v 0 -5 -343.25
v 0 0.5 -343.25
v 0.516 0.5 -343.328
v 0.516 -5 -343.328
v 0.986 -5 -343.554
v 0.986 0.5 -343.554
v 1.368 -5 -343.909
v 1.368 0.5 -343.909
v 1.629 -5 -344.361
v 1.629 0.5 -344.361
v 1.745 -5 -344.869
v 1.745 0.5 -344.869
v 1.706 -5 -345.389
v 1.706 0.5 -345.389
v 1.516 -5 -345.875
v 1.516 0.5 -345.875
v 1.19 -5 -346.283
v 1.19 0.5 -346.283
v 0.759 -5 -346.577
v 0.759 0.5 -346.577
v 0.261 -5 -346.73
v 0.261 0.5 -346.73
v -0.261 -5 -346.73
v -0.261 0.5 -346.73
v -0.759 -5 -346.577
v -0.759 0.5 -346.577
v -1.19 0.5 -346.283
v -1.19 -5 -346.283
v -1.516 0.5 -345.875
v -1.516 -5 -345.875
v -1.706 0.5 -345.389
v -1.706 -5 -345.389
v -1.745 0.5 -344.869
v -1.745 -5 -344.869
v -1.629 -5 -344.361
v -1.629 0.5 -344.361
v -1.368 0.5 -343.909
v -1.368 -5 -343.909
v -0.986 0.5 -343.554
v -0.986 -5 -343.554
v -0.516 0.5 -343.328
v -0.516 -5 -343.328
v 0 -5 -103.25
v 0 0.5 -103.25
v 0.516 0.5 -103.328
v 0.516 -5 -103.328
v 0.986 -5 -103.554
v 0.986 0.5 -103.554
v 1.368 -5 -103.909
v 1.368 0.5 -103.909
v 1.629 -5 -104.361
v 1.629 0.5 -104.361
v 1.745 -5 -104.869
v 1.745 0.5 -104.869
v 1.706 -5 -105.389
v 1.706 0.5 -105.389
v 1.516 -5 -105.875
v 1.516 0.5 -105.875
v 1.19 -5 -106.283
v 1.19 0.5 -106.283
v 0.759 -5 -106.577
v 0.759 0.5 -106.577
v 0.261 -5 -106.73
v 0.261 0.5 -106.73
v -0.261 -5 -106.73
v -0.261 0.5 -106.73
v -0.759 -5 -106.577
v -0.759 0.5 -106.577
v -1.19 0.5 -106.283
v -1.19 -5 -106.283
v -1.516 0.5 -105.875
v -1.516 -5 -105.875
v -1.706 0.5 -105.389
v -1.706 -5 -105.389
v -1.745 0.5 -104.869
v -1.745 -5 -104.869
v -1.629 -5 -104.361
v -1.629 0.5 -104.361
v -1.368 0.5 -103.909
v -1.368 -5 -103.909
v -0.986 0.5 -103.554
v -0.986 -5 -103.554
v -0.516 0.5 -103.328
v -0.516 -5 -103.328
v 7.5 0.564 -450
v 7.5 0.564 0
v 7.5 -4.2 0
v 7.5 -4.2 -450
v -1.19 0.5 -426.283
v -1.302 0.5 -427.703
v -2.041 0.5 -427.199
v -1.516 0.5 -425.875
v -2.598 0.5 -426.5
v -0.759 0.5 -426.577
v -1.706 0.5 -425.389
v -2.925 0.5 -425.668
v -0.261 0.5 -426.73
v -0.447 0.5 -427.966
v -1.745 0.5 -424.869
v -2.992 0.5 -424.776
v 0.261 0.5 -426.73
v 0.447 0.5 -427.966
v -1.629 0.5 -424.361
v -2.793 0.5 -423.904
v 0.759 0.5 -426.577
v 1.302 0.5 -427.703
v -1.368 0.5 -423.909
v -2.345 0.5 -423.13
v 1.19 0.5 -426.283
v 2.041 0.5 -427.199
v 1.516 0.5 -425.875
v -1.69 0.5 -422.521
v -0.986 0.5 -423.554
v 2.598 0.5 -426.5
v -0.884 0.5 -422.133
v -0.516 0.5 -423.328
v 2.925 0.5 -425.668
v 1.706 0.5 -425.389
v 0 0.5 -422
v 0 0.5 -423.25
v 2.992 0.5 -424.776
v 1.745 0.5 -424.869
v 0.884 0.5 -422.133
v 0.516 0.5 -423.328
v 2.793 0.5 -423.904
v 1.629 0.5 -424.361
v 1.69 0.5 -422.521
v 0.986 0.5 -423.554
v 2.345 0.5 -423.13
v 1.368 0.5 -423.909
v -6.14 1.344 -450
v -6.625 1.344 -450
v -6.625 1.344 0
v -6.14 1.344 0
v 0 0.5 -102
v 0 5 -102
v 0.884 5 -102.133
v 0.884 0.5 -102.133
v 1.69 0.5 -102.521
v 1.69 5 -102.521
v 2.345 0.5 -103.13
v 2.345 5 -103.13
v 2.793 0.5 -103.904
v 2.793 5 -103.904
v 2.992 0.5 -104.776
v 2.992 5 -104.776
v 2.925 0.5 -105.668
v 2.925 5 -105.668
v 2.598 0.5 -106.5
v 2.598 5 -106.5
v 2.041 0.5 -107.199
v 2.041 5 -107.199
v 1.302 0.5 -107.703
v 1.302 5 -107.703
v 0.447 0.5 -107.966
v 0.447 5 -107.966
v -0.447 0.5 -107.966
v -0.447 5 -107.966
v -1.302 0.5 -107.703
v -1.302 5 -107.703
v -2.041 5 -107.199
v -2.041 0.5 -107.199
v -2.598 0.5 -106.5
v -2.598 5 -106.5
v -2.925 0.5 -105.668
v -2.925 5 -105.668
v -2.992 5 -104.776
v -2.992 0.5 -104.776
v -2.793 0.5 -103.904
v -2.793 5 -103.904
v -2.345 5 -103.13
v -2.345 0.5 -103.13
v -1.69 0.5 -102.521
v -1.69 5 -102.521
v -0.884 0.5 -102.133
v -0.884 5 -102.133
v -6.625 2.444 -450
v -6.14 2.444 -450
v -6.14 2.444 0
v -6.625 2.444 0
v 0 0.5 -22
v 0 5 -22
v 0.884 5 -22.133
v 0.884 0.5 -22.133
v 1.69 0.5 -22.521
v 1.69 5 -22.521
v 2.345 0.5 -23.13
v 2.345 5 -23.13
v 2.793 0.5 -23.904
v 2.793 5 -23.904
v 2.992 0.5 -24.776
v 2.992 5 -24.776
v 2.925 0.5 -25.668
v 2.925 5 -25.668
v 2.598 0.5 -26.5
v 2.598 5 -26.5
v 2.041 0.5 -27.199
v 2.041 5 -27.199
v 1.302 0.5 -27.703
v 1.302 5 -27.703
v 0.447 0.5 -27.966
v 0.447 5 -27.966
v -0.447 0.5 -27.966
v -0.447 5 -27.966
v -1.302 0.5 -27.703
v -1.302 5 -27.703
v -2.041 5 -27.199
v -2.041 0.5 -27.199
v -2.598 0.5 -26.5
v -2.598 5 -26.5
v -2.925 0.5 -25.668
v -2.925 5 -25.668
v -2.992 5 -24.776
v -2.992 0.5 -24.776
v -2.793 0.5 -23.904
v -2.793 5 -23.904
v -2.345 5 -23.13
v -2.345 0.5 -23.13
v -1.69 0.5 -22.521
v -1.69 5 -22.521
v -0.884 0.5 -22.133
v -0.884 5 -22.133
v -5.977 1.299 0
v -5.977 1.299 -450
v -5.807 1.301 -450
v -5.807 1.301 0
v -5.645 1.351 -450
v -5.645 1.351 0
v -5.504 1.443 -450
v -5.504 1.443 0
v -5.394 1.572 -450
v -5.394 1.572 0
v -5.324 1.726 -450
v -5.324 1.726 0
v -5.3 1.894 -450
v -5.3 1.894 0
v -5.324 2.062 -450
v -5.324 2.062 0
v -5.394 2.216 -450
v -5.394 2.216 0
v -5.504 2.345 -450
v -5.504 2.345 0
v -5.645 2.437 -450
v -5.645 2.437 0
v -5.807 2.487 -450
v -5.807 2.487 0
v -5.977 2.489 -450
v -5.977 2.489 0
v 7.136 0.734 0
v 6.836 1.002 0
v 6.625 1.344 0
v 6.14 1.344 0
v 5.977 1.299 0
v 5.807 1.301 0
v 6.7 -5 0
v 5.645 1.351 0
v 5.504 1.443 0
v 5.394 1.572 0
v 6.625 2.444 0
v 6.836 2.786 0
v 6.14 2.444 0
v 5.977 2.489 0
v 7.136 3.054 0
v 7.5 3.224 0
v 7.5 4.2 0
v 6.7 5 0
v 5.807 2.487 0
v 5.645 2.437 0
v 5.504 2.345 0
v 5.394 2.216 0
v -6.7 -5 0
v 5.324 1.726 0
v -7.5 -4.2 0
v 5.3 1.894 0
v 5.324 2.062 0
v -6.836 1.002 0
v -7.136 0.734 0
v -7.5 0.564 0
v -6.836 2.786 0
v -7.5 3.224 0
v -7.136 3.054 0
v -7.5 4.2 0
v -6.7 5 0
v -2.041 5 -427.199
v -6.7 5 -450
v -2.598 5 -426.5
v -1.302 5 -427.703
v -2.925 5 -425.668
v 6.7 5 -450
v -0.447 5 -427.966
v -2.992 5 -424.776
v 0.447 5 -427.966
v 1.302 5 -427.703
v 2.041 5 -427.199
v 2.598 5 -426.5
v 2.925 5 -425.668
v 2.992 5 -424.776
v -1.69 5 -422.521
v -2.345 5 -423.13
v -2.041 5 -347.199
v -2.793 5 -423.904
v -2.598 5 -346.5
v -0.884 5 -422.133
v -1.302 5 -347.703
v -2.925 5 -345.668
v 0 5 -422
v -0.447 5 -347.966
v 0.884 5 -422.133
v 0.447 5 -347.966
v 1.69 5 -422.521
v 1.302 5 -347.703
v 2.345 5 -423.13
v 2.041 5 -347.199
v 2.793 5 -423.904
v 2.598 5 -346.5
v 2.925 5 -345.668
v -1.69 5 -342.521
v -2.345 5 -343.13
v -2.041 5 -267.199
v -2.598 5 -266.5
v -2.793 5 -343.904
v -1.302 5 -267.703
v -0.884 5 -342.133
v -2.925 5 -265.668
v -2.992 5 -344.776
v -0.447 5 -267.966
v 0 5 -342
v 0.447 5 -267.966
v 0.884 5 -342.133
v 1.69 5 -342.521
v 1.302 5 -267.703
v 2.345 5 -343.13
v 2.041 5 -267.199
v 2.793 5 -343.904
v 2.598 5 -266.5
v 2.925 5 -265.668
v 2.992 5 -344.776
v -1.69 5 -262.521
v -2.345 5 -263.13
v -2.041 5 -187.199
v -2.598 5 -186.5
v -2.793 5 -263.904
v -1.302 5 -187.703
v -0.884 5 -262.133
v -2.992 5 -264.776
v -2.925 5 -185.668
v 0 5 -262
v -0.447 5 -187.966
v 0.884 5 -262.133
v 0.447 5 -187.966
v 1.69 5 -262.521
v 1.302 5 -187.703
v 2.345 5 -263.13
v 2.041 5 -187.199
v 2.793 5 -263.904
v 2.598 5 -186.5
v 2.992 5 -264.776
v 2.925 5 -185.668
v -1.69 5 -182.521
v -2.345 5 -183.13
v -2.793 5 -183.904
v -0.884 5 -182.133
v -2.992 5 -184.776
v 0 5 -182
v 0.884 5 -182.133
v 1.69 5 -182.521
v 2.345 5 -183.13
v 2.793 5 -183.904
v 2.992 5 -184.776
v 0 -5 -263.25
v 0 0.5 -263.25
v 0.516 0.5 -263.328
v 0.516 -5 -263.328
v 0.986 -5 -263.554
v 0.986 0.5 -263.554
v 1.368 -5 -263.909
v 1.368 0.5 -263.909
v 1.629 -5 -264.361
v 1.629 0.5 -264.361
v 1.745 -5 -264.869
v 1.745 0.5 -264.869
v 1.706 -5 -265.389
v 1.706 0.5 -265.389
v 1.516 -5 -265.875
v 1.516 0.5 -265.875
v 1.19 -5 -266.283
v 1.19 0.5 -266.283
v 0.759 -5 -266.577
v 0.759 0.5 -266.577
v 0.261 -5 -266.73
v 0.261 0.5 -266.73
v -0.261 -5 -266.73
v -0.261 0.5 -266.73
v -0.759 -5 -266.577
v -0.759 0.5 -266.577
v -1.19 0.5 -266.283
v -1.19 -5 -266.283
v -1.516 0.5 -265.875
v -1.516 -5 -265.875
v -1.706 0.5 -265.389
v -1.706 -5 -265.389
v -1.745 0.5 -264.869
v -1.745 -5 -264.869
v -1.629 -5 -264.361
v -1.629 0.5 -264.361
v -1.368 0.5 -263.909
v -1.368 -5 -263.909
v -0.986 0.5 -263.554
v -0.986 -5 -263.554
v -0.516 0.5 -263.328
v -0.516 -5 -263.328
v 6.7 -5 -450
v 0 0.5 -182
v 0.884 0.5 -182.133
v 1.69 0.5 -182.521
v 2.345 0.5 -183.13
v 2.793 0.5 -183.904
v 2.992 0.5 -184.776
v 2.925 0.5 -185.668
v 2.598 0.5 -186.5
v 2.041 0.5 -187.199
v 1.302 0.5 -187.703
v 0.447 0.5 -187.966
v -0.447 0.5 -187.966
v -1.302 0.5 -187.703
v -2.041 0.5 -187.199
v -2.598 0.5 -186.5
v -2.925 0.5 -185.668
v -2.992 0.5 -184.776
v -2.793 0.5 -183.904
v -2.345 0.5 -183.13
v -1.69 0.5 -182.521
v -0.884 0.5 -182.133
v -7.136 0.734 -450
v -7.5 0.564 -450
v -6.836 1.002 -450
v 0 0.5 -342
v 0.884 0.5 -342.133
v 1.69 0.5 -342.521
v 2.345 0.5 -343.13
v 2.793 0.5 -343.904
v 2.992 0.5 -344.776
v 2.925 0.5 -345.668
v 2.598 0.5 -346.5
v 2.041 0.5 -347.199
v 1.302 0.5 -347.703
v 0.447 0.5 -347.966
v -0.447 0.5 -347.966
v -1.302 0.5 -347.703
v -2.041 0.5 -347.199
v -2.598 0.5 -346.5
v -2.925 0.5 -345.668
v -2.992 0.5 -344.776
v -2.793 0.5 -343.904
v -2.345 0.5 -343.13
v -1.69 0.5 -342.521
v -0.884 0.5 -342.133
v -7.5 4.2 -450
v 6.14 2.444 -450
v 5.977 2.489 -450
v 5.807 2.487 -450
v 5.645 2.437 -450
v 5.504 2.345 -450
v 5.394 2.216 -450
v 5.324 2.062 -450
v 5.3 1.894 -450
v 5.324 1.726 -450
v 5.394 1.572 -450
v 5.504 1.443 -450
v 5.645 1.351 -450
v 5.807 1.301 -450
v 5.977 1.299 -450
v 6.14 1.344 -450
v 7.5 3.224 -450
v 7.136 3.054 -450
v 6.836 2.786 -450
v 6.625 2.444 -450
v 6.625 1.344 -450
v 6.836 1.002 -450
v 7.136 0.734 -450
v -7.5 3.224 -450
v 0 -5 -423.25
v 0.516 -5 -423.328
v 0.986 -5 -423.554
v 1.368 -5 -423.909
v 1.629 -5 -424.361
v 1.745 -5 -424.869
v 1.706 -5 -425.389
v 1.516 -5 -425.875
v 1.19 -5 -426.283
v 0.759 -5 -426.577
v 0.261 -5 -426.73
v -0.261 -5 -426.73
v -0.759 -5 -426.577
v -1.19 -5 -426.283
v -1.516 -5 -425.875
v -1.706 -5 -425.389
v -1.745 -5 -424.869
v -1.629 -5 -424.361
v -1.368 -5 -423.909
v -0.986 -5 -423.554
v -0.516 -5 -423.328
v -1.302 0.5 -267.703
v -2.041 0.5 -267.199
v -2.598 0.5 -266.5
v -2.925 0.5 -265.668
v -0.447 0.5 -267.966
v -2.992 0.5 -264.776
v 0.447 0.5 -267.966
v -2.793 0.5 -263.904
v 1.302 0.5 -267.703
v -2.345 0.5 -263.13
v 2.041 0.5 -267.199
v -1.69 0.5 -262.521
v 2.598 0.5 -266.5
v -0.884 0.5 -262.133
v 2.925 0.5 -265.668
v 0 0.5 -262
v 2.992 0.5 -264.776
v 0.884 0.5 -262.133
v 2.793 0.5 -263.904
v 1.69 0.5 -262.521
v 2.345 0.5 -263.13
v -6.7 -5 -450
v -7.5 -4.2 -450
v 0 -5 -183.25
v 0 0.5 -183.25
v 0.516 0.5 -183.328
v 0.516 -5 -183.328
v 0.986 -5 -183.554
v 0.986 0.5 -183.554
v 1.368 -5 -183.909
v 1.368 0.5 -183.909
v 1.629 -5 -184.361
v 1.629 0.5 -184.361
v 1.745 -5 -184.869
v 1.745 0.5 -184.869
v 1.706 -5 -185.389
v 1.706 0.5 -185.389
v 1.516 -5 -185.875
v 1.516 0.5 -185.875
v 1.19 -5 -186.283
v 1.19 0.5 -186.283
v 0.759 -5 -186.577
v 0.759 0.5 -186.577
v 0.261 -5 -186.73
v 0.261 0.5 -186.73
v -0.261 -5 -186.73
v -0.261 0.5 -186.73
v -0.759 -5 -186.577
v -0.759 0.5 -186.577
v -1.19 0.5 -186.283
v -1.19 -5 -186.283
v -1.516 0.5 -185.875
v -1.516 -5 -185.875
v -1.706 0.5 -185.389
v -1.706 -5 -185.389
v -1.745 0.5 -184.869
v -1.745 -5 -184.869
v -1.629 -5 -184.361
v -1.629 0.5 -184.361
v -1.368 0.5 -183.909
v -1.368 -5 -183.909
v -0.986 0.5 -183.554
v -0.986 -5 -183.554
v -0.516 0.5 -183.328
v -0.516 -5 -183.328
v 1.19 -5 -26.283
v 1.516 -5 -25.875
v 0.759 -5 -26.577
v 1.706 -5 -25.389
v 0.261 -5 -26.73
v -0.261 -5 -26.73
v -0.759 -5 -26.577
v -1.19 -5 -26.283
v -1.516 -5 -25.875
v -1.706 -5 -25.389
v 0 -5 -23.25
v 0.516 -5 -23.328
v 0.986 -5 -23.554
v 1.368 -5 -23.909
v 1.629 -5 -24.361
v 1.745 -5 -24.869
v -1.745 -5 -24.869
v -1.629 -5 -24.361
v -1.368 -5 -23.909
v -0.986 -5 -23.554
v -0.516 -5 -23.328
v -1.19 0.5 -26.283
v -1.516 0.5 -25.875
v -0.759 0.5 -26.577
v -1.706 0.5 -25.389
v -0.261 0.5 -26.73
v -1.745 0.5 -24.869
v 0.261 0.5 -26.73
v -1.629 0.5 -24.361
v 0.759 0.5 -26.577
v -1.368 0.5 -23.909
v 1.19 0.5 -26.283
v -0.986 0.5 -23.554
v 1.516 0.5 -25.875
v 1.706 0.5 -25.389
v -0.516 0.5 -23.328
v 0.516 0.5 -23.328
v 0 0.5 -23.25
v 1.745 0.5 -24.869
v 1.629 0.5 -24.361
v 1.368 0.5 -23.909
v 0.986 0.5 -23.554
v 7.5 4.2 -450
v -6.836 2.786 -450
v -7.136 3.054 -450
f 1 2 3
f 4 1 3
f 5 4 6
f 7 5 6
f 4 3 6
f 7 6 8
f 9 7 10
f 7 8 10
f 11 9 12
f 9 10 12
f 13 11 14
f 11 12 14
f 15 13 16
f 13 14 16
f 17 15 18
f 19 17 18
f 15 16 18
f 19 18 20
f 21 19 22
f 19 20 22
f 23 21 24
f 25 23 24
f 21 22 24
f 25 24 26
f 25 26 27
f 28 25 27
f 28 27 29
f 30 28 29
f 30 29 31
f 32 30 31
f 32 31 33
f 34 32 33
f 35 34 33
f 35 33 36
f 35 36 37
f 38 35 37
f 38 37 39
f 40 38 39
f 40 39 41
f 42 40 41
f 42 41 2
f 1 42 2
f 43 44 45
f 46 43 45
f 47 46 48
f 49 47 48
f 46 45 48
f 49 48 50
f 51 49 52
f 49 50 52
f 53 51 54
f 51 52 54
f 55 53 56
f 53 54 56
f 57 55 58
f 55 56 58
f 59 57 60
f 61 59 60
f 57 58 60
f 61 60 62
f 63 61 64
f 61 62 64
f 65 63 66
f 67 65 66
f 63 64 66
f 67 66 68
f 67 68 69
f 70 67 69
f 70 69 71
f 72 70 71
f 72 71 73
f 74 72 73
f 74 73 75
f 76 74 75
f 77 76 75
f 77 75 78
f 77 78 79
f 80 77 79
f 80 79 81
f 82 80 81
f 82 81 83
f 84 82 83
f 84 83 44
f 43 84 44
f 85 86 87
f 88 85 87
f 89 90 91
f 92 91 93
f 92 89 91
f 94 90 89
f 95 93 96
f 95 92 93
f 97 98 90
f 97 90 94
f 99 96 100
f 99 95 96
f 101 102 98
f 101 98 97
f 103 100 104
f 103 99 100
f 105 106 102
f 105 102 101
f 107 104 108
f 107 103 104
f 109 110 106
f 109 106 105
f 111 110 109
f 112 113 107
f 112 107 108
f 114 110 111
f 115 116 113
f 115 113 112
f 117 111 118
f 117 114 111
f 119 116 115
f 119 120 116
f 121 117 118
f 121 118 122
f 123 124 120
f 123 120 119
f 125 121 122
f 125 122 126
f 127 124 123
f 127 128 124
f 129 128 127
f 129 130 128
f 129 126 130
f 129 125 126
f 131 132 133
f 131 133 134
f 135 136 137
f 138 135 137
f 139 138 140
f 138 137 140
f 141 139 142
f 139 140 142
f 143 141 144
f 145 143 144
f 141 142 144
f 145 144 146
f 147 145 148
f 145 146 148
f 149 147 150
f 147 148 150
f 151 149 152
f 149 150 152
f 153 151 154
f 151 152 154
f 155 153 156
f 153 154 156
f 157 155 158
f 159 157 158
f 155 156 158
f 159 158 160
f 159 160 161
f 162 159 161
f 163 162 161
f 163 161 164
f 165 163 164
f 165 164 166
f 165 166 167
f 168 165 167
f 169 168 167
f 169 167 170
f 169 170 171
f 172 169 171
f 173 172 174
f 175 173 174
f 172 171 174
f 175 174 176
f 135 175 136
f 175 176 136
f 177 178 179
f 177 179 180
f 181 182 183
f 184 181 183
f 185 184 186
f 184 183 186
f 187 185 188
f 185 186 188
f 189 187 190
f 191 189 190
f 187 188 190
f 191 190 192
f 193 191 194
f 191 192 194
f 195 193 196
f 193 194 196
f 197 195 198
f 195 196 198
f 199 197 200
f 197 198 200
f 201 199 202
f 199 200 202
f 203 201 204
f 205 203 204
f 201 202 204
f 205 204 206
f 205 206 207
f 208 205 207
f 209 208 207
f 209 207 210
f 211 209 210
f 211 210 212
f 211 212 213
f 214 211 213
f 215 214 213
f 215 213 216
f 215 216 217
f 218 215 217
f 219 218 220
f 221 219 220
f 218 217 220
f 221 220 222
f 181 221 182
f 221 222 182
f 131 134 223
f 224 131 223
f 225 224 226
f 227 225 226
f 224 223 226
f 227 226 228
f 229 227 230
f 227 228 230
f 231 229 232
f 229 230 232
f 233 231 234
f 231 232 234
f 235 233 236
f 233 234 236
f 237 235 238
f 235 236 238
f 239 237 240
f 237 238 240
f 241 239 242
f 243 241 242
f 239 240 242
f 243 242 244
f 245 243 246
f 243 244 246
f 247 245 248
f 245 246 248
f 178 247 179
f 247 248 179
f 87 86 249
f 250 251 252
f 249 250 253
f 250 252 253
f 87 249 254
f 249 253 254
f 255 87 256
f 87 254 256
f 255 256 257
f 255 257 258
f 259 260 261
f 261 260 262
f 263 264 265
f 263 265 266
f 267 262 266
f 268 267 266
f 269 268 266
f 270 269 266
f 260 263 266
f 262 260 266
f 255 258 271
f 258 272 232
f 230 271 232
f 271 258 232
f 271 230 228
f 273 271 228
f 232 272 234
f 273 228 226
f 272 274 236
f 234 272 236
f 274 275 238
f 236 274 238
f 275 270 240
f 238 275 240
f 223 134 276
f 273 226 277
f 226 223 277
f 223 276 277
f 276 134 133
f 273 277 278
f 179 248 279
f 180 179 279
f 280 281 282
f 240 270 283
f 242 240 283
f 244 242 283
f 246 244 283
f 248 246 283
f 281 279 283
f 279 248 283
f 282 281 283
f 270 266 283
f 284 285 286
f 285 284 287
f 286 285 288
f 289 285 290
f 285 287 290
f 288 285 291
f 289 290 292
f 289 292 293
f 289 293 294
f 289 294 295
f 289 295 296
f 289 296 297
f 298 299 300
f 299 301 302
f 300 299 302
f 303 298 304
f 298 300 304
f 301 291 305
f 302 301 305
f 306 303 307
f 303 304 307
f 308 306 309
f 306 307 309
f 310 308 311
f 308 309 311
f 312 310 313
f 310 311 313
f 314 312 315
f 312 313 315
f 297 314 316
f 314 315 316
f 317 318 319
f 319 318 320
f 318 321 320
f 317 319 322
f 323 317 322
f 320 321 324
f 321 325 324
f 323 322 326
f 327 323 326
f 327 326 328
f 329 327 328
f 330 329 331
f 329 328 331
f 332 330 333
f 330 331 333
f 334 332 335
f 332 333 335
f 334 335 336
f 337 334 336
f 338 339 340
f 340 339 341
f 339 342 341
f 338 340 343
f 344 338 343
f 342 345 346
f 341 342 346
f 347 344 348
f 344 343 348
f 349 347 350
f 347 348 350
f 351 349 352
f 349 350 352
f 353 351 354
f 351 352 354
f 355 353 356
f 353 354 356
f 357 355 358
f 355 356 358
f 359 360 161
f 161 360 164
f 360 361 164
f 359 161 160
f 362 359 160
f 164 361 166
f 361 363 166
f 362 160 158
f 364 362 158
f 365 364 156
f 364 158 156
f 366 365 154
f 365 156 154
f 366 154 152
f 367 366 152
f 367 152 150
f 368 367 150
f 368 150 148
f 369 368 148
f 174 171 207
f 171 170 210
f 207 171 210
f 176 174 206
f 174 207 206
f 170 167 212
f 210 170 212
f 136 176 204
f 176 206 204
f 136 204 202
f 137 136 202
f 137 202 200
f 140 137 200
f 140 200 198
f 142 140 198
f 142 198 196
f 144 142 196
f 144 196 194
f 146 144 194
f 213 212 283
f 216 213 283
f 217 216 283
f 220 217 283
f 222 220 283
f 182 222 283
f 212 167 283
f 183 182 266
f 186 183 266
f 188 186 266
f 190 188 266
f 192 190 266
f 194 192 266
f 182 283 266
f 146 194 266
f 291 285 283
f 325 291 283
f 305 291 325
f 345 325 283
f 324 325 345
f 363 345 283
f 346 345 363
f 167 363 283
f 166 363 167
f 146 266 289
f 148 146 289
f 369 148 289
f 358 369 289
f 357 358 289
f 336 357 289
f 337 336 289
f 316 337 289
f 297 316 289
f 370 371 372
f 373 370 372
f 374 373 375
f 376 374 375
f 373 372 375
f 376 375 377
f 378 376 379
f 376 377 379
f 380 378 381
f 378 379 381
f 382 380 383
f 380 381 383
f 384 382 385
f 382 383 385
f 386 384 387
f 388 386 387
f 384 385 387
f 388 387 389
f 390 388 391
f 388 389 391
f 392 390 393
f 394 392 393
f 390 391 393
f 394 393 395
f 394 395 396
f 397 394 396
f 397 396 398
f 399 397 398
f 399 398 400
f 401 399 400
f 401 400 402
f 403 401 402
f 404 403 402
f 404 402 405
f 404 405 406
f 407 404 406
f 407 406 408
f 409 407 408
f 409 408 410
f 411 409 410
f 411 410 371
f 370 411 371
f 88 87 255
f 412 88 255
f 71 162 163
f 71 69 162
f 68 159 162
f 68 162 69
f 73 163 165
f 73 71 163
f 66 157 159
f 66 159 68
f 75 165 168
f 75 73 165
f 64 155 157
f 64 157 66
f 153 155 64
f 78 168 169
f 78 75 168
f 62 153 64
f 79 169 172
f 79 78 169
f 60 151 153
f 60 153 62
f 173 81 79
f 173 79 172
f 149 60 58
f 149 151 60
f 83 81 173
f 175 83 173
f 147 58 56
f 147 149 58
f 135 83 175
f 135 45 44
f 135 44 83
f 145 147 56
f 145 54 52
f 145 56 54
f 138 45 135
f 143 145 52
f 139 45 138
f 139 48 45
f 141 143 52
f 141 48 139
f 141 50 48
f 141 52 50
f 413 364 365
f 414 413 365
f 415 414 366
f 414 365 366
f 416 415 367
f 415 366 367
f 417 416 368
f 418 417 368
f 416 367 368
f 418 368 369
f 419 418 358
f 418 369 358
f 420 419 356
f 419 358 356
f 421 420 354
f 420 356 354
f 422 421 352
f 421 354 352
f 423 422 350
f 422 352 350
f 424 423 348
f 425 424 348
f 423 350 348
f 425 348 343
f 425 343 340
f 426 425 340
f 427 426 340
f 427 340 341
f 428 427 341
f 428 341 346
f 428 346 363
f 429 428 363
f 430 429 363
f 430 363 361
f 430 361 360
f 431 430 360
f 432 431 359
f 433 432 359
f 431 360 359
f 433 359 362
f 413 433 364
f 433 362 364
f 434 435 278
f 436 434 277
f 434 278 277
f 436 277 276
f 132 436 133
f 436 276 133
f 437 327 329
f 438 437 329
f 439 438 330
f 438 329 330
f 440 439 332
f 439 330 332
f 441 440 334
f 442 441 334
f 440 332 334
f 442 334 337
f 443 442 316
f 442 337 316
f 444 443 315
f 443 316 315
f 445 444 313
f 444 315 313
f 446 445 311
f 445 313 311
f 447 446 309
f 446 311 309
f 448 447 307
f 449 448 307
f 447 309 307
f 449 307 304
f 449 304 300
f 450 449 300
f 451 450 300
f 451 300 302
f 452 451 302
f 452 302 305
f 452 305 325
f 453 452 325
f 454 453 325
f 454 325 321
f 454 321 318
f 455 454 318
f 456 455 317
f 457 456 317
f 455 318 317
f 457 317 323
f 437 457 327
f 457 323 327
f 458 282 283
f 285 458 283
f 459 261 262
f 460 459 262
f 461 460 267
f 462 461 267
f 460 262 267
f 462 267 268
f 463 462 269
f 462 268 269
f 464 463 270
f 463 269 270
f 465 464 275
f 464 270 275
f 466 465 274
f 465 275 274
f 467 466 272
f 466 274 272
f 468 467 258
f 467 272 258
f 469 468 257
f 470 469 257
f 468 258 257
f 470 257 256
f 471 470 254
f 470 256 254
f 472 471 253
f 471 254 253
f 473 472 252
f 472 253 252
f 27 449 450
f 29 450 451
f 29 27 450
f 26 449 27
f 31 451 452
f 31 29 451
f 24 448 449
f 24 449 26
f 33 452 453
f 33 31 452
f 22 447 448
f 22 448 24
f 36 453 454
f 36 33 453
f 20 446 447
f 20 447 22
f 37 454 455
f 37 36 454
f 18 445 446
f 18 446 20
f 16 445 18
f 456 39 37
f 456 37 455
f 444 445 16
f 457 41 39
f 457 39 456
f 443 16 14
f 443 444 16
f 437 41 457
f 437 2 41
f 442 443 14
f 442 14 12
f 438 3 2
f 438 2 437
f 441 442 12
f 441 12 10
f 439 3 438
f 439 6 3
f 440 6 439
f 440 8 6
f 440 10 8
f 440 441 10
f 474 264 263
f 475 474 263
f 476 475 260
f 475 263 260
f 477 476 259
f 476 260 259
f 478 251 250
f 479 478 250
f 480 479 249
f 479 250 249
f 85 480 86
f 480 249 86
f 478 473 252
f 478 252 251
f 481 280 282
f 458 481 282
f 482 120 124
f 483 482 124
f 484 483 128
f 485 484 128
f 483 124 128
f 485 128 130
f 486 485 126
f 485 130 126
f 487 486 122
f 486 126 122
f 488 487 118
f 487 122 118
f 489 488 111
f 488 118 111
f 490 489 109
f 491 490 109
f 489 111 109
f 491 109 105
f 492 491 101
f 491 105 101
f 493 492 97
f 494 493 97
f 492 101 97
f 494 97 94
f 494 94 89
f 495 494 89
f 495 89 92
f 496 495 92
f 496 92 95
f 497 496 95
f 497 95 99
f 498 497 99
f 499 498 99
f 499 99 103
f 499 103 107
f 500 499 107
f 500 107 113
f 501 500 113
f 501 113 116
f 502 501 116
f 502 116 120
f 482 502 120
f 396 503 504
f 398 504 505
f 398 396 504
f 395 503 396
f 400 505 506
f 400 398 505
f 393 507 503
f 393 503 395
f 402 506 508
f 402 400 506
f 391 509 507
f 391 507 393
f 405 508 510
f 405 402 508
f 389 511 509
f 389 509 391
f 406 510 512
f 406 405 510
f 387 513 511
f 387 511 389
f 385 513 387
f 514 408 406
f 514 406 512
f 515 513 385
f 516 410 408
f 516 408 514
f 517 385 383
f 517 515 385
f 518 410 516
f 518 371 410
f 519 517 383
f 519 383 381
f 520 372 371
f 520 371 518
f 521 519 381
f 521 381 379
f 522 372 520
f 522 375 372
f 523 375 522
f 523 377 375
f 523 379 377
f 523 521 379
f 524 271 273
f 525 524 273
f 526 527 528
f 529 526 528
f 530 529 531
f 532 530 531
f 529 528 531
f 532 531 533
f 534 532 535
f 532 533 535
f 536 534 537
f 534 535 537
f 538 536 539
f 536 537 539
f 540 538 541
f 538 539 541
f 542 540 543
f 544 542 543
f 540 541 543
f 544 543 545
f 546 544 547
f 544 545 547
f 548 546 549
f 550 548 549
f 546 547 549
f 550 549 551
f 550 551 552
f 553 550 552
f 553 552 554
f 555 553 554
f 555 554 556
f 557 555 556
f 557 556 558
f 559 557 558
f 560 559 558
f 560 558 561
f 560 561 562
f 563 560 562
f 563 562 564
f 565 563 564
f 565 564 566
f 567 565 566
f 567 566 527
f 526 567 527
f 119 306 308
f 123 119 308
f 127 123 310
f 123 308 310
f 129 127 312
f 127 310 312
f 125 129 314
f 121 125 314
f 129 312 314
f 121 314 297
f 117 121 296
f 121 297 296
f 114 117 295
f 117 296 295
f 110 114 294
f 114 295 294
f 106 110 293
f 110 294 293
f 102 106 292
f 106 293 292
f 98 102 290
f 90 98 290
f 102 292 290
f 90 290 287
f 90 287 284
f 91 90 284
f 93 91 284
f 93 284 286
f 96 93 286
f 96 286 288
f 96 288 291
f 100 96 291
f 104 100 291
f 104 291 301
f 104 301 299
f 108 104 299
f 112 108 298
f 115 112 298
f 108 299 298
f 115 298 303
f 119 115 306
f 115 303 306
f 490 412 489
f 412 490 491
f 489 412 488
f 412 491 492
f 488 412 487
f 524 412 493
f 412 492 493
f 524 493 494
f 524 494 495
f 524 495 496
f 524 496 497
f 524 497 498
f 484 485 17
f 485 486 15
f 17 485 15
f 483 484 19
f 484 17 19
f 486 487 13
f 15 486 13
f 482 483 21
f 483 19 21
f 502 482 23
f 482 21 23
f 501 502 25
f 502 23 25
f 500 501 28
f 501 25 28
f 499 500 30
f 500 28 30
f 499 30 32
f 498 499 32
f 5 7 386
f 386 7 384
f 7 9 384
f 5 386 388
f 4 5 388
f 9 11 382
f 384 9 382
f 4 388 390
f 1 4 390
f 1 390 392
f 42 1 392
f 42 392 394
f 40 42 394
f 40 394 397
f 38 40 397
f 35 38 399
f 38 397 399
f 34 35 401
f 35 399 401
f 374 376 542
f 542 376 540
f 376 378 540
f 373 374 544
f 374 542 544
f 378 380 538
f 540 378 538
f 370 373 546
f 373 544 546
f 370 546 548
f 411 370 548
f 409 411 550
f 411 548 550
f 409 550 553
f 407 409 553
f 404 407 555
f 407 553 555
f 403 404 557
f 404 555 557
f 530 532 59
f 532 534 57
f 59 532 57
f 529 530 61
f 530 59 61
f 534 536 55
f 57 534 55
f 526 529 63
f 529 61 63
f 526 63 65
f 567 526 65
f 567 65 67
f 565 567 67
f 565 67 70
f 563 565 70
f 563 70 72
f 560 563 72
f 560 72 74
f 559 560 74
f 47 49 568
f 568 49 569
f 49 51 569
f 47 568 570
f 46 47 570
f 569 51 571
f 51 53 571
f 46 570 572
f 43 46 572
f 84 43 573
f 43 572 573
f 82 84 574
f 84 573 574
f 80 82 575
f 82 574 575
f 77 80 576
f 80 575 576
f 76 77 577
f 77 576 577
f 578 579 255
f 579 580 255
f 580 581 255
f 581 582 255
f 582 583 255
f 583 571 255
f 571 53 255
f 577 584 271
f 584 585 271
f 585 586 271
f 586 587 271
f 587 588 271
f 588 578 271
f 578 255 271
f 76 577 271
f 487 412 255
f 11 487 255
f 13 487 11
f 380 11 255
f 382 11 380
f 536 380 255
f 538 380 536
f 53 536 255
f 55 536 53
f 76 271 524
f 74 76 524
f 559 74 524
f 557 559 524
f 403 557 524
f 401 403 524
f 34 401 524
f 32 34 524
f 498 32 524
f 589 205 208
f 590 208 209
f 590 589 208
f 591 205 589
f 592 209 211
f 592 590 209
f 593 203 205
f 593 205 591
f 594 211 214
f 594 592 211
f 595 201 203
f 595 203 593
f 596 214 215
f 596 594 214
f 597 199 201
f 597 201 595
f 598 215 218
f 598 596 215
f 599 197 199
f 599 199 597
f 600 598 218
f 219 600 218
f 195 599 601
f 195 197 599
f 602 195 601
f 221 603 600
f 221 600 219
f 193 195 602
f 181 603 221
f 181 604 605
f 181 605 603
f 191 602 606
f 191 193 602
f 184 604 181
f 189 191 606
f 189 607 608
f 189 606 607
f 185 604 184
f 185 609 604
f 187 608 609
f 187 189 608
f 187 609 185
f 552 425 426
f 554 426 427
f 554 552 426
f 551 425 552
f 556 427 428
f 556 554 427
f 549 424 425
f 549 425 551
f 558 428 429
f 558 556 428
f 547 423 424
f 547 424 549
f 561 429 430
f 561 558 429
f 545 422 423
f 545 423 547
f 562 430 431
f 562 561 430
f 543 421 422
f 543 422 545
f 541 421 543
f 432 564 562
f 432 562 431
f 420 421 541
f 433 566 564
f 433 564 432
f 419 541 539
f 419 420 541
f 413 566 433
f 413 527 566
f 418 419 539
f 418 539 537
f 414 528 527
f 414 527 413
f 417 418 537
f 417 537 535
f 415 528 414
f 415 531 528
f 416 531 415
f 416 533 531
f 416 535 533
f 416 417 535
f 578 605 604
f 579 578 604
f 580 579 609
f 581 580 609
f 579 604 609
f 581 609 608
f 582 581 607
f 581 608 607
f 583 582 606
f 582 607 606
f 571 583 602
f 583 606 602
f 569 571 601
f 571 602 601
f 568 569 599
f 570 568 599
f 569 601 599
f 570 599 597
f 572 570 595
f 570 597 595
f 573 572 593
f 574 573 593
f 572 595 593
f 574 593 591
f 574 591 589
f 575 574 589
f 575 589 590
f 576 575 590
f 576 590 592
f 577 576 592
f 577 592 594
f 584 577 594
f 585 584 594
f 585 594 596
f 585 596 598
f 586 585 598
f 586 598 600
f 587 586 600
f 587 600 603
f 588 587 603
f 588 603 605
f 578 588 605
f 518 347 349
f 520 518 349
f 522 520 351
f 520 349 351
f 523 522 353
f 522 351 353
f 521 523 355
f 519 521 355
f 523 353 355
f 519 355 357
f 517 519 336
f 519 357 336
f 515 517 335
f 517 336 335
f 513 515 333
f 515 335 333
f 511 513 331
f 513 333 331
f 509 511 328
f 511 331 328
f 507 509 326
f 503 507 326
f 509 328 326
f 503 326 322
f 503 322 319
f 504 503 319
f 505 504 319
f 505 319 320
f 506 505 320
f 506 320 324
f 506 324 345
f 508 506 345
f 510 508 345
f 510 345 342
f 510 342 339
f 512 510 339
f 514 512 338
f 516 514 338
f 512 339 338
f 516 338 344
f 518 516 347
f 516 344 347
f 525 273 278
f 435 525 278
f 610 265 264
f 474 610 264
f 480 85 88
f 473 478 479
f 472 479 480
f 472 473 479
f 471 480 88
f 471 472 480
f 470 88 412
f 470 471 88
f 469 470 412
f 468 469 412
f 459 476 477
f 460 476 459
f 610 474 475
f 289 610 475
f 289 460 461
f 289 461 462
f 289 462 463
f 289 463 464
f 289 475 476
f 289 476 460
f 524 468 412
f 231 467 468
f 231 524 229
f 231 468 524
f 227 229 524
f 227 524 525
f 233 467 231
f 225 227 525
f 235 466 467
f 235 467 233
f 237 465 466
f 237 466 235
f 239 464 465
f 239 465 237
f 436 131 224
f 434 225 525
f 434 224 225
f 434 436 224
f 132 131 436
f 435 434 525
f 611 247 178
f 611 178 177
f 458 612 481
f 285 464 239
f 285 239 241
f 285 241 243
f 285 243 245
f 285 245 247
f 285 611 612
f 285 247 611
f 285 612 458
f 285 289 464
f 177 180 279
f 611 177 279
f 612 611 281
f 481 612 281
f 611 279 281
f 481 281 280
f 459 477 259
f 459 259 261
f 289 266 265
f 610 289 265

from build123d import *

# Parameters (mm, degrees)
BOSS_EXTRUDE1_DEPTH = 450
SKETCH2_R           = 3
CUT_EXTRUDE1_DEPTH  = 4.5
SKETCH3_R           = 1.75
CUT_EXTRUDE2_DEPTH  = 451.09610085
LPATTERN1_COUNT     = 6
LPATTERN1_PITCH     = 80


with BuildPart() as part:
    # Sketch1 → Boss-Extrude1 (new body)
    with BuildSketch(Plane.XY):
        with BuildLine():
            Line((6.624531067, 2.444), (6.139791576, 2.444))
            ThreePointArc((6.139791576, 2.444), (5.3, 1.894), (6.139791576, 1.344))
            Line((6.139791576, 1.344), (6.624531067, 1.344))
            ThreePointArc((6.624531067, 1.344), (6.975900024, 0.857004226), (7.5, 0.563841739))
            Line((7.5, 0.563841739), (7.5, -4.2))
            Line((7.5, -4.2), (6.7, -5))
            Line((6.7, -5), (-6.7, -5))
            Line((-6.7, -5), (-7.5, -4.2))
            Line((-7.5, -4.2), (-7.5, 0.563841739))
            ThreePointArc((-7.5, 0.563841739), (-6.975900024, 0.857004226), (-6.624531067, 1.344))
            Line((-6.624531067, 1.344), (-6.139791576, 1.344))
            ThreePointArc((-6.139791576, 1.344), (-5.3, 1.894), (-6.139791576, 2.444))
            Line((-6.139791576, 2.444), (-6.624531067, 2.444))
            ThreePointArc((-6.624531067, 2.444), (-6.975900024, 2.930995774), (-7.5, 3.224158261))
            Line((-7.5, 3.224158261), (-7.5, 4.2))
            Line((-7.5, 4.2), (-6.7, 5))
            Line((-6.7, 5), (6.7, 5))
            Line((6.7, 5), (7.5, 4.2))
            Line((7.5, 4.2), (7.5, 3.224158261))
            ThreePointArc((7.5, 3.224158261), (6.975900024, 2.930995774), (6.624531067, 2.444))
        make_face()
    extrude(amount=-BOSS_EXTRUDE1_DEPTH)

    # Sketch2 → Cut-Extrude1 (cut)
    with BuildSketch(Plane(origin=(0, 5, 0), x_dir=(1, 0, 0), z_dir=(0, 1, 0))):
        with Locations(Location((0, 25, 0), (0, 0, 270))):
            Circle(SKETCH2_R)
    cut_extrude1 = extrude(amount=-CUT_EXTRUDE1_DEPTH, mode=Mode.SUBTRACT)

    # Sketch3 → Cut-Extrude2 (cut, through all)
    with BuildSketch(Plane(origin=(0, 0.5, 0), x_dir=(1, 0, 0), z_dir=(0, 1, 0))):
        with Locations(Location((0, 25, 0), (0, 0, 270))):
            Circle(SKETCH3_R)
    cut_extrude2 = extrude(amount=-CUT_EXTRUDE2_DEPTH, mode=Mode.SUBTRACT)

    # LPattern1: Cut-Extrude1, Cut-Extrude2 ×6
    with Locations(*[(0, 0, -i * LPATTERN1_PITCH) for i in range(1, LPATTERN1_COUNT)]):
        add(cut_extrude1, mode=Mode.SUBTRACT)
        add(cut_extrude2, mode=Mode.SUBTRACT)


solid = part.part
